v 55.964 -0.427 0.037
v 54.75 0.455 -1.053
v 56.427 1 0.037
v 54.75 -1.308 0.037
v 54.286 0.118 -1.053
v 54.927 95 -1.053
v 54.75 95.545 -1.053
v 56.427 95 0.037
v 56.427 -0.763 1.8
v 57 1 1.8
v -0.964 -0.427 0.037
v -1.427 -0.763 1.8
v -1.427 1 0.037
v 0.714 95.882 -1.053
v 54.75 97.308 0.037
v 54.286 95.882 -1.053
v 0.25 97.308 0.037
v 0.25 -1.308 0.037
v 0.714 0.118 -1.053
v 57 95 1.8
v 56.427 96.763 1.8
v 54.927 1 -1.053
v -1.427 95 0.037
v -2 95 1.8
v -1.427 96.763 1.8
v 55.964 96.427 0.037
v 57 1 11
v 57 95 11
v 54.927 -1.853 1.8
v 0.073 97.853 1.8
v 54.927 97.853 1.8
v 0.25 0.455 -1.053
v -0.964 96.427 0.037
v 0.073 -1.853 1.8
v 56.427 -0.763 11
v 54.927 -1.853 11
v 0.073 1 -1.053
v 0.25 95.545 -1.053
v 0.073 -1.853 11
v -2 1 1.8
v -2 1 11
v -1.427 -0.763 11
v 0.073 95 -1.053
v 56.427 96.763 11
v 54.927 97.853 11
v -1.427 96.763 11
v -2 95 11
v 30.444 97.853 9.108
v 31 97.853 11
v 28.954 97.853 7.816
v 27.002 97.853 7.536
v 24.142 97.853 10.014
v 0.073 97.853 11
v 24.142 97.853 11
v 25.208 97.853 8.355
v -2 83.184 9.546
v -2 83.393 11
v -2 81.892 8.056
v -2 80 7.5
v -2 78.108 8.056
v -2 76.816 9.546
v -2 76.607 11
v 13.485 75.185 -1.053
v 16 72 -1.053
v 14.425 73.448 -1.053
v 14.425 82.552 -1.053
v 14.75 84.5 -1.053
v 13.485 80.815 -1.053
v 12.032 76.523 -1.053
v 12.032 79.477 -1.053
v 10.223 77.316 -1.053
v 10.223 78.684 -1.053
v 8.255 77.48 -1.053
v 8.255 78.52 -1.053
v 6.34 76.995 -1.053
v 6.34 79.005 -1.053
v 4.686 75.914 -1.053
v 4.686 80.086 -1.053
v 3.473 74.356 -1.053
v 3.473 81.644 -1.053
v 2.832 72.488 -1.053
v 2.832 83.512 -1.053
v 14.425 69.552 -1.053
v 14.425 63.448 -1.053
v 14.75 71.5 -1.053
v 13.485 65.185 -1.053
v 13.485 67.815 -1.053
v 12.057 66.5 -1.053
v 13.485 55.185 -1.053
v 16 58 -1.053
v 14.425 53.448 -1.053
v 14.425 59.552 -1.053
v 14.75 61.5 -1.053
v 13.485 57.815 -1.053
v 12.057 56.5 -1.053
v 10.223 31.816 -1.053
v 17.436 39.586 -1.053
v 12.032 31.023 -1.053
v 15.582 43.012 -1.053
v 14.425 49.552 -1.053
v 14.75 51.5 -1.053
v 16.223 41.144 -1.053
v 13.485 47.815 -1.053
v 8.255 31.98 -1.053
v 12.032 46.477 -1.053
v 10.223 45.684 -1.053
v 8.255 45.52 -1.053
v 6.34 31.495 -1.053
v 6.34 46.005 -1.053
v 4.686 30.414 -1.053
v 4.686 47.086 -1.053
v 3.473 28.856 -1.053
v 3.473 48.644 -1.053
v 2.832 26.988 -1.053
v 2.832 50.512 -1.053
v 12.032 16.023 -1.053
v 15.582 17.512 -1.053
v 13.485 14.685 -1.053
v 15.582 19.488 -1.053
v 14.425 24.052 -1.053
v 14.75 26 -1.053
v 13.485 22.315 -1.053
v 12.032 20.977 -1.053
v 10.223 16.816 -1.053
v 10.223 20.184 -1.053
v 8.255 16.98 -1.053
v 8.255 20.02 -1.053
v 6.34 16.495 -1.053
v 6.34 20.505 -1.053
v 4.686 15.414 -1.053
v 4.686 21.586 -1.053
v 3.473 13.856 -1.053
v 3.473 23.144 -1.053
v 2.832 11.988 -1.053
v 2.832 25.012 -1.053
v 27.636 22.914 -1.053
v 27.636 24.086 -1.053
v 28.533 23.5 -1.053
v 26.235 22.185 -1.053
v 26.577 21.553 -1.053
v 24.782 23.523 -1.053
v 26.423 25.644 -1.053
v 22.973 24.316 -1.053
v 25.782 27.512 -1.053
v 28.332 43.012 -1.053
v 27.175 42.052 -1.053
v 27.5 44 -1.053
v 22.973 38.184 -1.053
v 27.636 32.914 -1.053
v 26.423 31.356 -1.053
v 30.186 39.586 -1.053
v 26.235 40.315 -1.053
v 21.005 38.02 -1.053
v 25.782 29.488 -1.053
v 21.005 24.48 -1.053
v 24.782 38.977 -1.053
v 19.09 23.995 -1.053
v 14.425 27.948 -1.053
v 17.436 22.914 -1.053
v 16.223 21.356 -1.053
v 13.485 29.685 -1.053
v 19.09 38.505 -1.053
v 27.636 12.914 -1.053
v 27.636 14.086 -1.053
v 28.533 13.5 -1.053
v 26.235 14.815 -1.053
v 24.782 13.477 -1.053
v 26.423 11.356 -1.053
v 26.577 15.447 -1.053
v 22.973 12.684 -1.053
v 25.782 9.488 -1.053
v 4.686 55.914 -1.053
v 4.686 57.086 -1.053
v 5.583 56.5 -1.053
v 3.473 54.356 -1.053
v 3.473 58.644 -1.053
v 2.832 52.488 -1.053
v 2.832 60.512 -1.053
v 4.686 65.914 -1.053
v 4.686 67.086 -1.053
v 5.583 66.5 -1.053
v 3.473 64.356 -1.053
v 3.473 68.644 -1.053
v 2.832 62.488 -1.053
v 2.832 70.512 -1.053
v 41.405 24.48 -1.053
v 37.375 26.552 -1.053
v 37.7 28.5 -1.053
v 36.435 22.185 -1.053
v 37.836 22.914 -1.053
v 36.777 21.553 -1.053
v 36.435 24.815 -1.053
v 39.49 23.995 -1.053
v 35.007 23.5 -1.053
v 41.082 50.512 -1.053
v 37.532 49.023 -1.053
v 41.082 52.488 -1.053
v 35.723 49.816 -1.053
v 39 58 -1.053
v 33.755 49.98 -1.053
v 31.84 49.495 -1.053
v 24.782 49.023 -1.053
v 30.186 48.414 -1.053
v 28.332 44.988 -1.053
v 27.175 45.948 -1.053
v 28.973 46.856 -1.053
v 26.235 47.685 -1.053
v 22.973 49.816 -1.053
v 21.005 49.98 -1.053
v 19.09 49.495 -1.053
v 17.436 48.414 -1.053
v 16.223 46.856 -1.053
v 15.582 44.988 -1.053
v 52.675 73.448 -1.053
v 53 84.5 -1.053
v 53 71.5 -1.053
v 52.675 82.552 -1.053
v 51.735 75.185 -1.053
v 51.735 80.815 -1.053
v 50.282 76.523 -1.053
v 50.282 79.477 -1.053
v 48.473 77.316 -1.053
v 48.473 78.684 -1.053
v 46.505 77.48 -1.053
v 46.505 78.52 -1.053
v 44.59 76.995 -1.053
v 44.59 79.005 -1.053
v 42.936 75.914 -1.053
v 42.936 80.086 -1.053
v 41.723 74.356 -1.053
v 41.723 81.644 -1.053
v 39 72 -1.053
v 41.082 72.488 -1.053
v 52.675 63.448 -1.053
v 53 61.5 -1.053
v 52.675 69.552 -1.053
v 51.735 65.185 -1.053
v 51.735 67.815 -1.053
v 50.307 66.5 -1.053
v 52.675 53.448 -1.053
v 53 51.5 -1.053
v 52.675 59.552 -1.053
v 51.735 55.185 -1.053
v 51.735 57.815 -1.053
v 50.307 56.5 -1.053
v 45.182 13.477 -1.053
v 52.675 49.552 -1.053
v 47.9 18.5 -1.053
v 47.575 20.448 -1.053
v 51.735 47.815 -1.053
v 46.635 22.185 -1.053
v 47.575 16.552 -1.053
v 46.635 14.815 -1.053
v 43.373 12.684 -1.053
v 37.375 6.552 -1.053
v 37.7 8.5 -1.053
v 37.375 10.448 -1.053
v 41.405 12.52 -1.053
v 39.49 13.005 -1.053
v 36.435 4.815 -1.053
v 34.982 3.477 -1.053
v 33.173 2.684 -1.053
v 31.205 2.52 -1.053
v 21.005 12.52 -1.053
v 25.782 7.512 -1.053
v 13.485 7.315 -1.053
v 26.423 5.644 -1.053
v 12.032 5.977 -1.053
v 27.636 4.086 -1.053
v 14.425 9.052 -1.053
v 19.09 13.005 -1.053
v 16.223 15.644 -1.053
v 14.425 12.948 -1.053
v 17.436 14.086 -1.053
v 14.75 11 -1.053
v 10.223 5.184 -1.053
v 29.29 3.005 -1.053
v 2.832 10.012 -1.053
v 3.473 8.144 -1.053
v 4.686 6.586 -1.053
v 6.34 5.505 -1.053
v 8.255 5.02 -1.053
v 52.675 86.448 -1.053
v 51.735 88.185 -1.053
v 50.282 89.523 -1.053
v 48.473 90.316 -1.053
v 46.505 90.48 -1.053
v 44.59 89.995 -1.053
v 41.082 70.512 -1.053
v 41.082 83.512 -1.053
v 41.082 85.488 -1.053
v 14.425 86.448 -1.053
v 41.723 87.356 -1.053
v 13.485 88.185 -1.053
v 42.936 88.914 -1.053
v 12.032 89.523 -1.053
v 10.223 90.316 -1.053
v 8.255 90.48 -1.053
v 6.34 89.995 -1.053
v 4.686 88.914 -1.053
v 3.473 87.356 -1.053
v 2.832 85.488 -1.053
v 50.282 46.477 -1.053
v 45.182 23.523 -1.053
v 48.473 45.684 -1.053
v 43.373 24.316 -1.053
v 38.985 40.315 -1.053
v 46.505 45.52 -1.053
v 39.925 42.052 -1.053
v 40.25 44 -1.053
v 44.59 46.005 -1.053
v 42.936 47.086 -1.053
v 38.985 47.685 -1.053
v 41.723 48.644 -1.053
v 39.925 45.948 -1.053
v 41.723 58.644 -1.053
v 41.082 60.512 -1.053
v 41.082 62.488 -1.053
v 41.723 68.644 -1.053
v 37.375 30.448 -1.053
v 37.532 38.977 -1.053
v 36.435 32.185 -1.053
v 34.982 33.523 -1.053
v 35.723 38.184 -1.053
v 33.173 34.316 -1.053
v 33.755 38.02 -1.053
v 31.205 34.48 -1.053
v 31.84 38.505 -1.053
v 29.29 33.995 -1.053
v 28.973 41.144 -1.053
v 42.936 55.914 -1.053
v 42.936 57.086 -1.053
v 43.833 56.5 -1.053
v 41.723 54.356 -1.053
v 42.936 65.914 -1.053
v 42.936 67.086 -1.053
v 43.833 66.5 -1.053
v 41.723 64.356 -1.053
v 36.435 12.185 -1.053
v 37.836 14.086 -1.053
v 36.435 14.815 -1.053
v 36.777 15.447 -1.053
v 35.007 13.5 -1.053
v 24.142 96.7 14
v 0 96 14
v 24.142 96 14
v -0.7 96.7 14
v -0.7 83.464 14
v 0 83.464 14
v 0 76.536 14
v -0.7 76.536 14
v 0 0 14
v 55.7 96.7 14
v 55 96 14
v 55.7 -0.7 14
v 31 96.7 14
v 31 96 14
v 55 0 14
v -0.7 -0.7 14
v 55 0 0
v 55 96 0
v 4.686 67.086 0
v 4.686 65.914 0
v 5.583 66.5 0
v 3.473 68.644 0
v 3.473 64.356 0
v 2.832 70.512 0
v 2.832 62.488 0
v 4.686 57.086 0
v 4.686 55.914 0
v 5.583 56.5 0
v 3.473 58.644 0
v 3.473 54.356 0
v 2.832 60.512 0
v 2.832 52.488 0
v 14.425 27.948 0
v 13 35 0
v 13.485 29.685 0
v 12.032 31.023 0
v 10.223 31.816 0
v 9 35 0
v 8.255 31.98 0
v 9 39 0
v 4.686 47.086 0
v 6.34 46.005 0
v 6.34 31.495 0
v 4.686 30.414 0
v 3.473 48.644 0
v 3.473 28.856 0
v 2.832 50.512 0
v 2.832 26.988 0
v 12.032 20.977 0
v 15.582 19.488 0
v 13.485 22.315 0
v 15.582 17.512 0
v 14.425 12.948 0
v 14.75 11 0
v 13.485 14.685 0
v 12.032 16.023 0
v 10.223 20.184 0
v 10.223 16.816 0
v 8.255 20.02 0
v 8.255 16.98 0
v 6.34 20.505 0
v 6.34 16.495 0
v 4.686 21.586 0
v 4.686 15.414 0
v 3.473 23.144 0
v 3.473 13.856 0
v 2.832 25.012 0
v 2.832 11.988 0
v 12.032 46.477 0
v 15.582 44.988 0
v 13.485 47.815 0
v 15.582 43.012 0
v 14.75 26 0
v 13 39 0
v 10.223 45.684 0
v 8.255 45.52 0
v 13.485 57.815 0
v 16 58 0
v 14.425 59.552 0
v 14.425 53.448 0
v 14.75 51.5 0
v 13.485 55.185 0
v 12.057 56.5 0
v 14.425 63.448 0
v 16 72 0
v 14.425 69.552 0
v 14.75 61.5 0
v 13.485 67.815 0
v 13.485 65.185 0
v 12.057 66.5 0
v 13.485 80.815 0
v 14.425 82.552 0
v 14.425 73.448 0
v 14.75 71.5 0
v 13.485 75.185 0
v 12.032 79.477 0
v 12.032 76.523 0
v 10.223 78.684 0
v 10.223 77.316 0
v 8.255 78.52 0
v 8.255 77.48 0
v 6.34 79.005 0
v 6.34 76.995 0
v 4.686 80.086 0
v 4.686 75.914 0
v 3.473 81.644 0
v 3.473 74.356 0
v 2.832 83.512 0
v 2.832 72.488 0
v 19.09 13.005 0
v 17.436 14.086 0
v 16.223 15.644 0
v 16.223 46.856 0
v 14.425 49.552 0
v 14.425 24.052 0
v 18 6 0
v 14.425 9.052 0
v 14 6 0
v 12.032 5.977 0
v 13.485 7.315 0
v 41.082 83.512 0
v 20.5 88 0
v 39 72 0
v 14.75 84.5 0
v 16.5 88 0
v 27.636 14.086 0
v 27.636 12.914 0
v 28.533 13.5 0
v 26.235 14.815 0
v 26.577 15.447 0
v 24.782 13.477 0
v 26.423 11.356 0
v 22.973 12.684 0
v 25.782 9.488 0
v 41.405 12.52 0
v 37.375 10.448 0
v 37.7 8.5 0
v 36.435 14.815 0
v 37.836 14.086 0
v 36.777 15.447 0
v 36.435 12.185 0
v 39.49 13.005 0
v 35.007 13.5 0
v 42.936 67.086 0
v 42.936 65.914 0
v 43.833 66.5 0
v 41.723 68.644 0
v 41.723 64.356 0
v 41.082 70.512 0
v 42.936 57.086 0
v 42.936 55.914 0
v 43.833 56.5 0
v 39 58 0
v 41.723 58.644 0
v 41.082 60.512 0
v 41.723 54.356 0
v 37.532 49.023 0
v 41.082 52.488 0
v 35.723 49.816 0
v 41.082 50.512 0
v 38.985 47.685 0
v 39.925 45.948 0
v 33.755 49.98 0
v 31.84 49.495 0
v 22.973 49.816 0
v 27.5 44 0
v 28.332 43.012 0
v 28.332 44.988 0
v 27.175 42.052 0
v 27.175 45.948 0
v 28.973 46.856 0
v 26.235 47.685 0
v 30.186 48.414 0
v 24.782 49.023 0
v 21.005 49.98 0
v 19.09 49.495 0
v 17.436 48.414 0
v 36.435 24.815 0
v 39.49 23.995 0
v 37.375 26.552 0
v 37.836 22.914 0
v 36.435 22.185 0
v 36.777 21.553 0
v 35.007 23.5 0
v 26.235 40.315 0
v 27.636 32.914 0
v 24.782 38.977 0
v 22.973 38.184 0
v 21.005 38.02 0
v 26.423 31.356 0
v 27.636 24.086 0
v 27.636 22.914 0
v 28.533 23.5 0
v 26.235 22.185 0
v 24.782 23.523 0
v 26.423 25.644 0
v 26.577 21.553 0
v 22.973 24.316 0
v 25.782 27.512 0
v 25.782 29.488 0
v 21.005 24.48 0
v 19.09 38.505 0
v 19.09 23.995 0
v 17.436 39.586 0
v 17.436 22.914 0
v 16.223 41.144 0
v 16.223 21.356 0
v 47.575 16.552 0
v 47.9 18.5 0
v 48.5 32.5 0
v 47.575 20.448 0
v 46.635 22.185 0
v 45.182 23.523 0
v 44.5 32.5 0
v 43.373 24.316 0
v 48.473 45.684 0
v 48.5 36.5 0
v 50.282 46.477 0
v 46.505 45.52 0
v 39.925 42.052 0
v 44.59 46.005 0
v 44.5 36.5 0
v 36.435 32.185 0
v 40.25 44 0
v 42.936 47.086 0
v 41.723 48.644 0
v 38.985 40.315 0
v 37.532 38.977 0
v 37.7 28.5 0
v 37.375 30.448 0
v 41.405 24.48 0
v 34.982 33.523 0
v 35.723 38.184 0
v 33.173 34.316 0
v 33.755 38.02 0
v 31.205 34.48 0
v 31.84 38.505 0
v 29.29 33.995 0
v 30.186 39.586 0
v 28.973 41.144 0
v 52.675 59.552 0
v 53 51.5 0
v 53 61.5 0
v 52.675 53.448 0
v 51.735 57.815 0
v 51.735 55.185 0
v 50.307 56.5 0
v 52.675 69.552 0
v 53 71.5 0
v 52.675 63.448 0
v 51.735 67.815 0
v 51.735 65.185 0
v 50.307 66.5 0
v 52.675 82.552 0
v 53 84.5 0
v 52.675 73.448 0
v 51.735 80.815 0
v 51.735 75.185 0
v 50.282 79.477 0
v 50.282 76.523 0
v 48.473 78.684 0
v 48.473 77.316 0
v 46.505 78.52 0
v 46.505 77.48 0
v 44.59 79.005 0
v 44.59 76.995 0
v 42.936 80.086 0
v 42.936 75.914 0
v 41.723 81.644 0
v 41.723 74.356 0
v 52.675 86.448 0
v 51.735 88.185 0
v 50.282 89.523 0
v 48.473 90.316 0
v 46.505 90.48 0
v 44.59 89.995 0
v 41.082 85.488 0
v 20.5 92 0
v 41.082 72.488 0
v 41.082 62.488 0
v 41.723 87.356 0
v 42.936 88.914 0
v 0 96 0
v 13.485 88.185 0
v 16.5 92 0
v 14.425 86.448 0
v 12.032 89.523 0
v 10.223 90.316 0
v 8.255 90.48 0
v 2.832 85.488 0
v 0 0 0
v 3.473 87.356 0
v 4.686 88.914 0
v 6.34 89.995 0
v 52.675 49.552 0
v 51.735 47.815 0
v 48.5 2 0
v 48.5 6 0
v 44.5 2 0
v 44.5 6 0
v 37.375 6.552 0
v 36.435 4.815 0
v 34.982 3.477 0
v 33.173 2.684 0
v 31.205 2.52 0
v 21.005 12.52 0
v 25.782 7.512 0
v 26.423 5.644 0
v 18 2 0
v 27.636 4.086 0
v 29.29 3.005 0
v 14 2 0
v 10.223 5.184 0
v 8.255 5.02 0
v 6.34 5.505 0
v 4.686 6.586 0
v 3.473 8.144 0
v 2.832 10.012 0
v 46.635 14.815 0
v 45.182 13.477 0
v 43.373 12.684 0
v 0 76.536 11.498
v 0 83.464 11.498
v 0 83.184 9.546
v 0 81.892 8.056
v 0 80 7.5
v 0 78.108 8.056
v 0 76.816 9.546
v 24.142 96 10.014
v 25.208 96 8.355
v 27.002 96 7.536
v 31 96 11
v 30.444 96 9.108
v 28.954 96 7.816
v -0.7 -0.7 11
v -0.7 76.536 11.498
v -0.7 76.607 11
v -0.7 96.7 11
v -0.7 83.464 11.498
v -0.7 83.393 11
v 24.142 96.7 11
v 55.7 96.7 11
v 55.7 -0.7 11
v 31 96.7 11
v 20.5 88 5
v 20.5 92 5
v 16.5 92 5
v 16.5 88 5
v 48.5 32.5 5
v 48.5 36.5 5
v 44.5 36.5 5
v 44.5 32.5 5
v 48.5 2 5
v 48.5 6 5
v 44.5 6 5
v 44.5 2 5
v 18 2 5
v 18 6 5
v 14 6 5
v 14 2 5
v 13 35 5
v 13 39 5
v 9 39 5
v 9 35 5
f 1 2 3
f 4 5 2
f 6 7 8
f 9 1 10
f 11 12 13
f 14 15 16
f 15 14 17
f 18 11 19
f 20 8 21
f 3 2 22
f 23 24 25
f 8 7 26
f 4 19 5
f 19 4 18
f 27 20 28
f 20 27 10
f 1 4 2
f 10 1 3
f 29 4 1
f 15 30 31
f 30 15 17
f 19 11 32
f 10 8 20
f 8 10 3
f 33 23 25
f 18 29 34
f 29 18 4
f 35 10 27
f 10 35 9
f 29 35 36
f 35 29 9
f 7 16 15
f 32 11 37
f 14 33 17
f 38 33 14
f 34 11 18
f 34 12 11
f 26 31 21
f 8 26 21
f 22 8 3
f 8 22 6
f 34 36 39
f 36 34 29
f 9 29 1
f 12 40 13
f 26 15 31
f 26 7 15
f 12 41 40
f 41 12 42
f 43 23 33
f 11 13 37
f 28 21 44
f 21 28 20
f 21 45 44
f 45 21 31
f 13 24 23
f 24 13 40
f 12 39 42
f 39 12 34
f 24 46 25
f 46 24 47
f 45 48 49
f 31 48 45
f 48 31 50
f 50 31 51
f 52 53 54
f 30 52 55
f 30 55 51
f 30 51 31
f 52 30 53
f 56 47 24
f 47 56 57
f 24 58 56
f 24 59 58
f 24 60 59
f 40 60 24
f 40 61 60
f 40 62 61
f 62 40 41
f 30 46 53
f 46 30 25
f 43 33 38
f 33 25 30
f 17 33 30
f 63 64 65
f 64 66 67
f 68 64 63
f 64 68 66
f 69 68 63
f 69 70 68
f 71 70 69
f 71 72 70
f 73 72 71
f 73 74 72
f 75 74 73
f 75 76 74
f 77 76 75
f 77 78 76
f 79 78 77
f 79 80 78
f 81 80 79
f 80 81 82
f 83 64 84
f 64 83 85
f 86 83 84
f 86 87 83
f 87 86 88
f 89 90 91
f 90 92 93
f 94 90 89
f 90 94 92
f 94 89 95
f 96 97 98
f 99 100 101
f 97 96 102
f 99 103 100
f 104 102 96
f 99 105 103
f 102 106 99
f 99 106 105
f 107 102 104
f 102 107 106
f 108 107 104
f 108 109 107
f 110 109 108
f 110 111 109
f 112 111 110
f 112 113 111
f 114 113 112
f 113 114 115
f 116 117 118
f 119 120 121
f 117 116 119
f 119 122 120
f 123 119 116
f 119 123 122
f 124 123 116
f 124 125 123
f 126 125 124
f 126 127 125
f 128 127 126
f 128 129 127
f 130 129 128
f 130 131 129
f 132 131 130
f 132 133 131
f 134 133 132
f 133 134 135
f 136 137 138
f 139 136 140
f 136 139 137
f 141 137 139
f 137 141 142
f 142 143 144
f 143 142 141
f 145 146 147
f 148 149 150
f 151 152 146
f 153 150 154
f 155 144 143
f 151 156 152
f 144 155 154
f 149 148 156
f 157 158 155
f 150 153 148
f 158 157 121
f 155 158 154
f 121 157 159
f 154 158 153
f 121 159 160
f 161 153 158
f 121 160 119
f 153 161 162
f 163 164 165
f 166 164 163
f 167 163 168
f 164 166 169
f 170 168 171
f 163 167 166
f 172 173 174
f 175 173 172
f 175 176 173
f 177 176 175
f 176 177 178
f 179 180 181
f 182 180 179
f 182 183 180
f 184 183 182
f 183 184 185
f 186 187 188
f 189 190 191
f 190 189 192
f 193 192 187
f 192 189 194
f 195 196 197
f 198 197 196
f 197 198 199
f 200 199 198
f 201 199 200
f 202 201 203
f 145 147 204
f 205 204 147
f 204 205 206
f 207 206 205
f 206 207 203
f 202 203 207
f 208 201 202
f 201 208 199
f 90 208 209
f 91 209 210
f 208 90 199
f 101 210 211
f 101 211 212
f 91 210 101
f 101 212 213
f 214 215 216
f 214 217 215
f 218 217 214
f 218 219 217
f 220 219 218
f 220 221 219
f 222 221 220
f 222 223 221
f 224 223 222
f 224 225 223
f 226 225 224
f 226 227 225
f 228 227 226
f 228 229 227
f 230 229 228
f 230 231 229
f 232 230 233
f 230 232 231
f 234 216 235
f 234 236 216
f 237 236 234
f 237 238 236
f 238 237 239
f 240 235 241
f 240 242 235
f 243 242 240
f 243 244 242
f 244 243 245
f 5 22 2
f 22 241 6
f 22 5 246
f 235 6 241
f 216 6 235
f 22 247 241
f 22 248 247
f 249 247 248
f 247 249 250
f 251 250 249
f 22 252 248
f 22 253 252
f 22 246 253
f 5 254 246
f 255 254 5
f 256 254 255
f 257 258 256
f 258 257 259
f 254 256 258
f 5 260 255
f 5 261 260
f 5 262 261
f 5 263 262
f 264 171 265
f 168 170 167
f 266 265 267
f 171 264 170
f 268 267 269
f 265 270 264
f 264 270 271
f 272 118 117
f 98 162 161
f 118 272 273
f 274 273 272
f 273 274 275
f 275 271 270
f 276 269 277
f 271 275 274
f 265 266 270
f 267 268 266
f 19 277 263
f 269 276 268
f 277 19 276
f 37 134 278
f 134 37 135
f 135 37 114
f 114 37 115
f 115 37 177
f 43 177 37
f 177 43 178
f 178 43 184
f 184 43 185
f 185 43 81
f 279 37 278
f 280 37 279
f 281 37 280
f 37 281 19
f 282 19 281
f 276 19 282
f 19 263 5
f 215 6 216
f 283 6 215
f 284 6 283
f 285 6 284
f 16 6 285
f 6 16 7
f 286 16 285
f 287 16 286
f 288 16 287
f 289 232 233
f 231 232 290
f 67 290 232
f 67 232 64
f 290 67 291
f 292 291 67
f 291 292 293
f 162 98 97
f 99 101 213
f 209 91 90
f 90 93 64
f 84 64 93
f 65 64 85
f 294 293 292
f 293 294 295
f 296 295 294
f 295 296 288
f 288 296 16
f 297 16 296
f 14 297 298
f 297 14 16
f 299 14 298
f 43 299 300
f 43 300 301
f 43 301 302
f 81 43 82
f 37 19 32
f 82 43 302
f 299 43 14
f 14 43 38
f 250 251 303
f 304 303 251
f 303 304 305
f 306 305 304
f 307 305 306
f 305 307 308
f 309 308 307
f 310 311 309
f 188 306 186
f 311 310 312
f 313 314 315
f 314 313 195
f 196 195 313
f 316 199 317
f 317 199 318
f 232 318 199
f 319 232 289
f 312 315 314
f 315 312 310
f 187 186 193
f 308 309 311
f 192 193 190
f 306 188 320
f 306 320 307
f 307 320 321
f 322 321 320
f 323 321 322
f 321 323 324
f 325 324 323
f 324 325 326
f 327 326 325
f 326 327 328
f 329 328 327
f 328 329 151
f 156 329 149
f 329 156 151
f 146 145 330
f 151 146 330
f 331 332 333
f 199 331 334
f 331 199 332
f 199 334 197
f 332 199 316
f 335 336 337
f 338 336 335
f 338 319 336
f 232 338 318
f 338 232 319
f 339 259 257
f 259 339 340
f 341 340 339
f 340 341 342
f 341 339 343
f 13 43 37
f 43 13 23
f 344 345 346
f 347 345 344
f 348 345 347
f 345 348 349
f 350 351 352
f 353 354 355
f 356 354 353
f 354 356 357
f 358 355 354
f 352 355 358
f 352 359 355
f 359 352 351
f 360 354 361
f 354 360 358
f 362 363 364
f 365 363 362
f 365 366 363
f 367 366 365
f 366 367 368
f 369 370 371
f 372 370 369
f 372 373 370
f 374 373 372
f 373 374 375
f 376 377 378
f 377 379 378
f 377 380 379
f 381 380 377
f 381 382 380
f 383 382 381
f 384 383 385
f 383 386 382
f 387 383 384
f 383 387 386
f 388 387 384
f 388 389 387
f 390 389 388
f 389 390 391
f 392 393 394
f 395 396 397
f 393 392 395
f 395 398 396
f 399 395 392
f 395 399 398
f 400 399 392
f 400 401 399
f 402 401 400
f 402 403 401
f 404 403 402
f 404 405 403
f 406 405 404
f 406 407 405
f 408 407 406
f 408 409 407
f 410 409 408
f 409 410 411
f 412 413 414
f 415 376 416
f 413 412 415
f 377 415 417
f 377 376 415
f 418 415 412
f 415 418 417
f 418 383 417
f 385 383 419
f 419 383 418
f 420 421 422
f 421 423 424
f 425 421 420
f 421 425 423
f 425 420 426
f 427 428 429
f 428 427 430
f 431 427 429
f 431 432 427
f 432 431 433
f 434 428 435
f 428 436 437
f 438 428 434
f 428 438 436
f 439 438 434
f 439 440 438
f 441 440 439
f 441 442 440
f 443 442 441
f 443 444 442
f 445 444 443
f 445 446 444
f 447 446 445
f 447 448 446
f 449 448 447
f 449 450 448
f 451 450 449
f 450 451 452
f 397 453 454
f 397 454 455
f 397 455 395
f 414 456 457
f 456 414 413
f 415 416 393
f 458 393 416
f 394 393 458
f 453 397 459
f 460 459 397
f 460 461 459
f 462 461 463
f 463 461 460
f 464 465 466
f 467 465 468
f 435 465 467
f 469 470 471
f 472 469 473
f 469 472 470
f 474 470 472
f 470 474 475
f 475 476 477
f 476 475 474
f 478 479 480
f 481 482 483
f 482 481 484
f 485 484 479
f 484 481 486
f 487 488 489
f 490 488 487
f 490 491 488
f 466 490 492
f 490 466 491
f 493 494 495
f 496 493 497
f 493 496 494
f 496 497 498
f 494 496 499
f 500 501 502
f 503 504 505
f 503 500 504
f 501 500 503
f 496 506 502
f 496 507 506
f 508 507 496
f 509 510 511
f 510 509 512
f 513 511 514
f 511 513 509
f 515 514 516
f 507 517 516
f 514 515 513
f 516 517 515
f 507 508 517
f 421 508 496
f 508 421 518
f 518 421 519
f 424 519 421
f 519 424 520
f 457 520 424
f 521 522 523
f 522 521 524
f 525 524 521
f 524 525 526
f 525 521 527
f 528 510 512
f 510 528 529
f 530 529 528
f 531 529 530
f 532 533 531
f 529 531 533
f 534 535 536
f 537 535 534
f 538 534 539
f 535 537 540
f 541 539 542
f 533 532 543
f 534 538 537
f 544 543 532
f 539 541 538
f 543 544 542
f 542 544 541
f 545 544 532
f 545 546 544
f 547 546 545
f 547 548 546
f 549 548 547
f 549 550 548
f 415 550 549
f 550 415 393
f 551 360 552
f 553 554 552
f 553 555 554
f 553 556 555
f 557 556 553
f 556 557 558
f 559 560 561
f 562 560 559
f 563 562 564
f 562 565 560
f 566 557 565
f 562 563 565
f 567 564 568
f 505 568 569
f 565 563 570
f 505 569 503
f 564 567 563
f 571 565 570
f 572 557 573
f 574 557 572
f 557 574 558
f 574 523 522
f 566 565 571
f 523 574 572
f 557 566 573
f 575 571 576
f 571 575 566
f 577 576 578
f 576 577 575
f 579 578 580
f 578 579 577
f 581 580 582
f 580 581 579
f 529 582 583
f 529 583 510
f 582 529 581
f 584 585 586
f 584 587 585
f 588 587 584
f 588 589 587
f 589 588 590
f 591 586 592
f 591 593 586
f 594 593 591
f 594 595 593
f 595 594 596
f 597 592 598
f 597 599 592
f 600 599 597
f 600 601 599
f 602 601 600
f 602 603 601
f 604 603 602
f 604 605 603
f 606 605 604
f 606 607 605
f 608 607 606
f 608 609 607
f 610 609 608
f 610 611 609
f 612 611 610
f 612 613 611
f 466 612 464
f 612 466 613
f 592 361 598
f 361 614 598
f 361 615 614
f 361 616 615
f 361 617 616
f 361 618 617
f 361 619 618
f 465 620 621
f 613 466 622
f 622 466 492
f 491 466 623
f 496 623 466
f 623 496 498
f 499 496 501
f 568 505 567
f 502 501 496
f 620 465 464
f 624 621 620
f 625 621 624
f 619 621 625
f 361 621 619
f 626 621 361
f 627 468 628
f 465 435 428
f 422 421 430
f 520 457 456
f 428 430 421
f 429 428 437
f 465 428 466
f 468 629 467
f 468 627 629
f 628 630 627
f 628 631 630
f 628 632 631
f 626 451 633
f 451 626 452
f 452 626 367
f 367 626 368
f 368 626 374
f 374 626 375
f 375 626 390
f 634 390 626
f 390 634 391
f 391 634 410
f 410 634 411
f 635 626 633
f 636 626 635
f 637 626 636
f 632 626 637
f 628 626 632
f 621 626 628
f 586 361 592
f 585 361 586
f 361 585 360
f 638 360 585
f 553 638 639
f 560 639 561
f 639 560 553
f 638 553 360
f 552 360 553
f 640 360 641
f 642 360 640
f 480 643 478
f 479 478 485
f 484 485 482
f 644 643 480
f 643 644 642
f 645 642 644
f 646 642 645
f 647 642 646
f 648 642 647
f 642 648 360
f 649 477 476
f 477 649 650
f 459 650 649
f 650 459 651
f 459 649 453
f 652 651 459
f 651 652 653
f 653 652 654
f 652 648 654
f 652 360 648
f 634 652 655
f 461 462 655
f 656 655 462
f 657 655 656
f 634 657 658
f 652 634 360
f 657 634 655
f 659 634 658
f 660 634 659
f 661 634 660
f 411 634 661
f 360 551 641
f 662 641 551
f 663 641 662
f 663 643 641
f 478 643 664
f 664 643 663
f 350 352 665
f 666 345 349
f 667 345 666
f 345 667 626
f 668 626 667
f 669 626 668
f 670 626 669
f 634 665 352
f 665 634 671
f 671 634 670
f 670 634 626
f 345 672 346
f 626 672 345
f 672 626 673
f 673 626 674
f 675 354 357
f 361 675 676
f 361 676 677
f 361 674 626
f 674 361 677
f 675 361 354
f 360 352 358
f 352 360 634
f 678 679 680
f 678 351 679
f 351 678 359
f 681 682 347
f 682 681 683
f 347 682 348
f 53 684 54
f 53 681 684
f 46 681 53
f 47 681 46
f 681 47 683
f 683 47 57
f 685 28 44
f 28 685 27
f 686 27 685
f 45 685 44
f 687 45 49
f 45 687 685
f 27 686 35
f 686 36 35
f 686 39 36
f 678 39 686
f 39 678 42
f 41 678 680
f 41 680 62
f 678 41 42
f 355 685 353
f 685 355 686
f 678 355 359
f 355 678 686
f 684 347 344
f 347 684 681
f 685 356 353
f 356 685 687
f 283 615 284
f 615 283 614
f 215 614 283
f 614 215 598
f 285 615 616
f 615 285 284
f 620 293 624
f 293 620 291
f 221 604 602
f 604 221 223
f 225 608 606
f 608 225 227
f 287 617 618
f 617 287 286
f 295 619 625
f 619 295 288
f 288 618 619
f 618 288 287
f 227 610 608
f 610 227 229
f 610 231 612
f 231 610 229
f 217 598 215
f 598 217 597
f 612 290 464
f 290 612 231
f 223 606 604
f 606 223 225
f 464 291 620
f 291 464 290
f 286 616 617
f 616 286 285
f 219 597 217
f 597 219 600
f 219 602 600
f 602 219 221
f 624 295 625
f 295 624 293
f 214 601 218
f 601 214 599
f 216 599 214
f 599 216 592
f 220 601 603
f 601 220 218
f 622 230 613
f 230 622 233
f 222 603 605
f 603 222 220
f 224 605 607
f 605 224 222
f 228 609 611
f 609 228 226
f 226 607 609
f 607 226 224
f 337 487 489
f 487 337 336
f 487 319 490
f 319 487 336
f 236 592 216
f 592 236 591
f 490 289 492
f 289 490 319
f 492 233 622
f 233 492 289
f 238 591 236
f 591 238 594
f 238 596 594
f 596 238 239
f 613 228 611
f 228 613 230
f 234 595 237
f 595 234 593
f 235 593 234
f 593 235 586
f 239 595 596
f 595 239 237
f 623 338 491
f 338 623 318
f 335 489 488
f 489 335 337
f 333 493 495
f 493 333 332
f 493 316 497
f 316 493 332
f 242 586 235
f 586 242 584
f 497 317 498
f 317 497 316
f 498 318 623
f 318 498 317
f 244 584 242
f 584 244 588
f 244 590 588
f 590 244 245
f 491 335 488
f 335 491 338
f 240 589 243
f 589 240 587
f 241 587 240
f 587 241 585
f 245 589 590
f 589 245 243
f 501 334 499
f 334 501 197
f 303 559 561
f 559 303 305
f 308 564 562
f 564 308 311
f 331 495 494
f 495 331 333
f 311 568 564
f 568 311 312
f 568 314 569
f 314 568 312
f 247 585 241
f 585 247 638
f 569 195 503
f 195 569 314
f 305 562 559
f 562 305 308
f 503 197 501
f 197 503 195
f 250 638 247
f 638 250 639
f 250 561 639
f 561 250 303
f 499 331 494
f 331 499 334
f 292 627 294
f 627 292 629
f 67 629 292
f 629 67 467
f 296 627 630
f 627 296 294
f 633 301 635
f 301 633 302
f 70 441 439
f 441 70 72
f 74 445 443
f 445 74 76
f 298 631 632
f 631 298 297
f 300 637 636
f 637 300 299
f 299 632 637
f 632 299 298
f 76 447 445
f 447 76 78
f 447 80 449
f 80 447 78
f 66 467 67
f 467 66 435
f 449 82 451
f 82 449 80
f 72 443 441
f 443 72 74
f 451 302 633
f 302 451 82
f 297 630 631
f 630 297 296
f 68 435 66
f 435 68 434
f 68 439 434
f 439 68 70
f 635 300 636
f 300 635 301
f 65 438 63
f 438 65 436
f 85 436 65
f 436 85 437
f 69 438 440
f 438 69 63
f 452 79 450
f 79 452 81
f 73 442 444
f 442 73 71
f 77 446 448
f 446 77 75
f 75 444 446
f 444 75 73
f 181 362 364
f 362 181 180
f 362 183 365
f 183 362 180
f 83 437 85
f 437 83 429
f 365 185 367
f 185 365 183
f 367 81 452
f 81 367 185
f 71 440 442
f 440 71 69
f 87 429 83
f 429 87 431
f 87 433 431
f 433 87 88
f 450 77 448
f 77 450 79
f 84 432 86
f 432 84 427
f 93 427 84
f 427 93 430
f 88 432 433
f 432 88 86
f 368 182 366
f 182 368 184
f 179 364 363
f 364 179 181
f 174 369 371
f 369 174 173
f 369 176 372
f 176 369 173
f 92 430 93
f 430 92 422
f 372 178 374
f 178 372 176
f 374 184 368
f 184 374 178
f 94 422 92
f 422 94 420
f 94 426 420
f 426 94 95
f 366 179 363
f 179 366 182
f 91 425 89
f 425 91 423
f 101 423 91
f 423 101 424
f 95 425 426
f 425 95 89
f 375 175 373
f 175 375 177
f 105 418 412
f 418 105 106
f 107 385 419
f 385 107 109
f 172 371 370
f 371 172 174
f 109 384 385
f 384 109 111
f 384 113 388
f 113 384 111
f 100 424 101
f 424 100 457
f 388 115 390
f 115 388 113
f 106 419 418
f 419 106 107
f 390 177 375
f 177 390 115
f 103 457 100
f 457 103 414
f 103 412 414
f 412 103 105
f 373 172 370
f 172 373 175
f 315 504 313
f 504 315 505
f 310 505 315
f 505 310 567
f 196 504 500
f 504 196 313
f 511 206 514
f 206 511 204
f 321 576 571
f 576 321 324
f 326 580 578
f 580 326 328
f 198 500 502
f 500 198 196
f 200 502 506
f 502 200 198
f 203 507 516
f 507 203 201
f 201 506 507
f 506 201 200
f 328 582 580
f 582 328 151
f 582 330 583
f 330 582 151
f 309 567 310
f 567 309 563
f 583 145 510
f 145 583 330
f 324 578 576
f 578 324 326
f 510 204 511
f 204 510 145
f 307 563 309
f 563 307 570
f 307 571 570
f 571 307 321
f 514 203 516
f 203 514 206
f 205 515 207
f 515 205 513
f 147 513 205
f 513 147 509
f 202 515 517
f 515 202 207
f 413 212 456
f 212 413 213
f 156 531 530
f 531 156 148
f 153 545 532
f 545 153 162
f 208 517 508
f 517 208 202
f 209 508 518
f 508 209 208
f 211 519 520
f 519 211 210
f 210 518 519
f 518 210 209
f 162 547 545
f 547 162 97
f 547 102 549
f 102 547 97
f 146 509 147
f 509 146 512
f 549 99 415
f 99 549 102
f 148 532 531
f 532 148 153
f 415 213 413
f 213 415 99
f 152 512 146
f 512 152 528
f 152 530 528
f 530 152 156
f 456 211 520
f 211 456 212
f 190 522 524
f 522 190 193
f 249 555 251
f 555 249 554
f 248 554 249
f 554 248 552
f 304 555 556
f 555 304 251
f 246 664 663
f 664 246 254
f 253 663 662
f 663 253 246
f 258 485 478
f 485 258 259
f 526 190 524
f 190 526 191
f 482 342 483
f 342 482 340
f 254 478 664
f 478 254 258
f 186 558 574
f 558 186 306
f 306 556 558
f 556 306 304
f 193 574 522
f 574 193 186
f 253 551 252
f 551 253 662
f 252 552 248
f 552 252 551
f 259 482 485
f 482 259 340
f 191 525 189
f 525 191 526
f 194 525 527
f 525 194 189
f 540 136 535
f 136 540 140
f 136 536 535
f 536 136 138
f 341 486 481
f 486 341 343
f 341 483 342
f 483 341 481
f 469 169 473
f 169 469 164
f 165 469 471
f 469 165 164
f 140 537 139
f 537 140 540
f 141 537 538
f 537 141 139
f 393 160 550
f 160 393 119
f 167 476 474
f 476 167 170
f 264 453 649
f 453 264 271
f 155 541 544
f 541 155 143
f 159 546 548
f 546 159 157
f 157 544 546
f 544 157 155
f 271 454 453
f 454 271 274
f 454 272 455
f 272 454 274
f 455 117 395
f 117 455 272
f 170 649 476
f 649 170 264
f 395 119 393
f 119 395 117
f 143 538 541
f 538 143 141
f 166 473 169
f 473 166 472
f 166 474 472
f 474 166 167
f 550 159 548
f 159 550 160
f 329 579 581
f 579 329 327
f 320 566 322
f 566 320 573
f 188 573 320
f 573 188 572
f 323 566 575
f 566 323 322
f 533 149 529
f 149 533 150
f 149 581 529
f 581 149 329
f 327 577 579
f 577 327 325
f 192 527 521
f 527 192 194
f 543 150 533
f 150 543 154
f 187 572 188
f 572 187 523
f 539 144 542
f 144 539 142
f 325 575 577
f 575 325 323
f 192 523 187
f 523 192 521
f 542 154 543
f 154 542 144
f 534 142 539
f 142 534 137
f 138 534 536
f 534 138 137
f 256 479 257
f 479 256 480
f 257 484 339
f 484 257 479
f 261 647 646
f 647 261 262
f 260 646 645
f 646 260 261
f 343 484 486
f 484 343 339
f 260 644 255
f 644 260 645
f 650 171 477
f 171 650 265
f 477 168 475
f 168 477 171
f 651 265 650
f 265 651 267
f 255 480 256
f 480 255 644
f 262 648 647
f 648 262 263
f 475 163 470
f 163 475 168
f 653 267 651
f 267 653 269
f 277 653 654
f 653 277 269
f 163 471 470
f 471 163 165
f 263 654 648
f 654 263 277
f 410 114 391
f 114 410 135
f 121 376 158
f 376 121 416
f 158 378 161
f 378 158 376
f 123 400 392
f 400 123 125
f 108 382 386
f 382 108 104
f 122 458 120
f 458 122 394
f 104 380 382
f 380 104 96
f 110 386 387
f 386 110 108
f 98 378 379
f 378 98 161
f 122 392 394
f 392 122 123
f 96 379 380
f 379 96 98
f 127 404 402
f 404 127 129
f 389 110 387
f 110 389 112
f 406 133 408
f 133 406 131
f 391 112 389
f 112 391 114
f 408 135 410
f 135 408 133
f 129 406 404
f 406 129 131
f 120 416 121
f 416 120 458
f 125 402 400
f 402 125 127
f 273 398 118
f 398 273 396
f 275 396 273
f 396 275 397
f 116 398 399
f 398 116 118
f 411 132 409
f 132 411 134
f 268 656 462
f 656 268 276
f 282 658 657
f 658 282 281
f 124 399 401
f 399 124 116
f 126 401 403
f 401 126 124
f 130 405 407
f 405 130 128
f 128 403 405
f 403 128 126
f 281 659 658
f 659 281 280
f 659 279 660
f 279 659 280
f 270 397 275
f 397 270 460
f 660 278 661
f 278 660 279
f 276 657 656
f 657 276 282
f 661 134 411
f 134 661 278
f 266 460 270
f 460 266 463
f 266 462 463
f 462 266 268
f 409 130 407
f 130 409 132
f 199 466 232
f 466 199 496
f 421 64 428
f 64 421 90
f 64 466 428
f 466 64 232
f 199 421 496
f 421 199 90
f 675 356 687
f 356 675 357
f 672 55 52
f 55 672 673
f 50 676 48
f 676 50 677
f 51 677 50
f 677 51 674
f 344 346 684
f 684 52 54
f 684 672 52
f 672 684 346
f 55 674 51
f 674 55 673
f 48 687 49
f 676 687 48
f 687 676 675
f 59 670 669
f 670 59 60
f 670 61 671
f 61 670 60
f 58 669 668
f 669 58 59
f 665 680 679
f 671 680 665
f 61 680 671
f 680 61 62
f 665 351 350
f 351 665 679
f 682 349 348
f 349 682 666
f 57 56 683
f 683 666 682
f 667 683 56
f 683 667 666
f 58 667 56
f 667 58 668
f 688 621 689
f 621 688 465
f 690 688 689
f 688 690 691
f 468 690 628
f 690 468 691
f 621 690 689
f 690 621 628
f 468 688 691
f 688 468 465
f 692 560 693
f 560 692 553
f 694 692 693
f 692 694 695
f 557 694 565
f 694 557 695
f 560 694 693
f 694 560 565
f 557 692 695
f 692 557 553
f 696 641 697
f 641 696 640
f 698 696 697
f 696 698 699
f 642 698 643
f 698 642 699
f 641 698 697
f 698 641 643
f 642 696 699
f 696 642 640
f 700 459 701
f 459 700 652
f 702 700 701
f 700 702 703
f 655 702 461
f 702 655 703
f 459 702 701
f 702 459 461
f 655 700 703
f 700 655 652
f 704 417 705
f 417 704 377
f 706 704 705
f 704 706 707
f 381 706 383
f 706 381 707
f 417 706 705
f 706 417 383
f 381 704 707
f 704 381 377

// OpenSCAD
/*

    A case for my custom built TV Remote Control.
    It contains two circuit boards sanwiched together (which is why it is quite chunky).
    The top one, just has buttons and a small screen, the bottom one has the arduino.
    
    Print Notes
        I had some trouble with warping, and lifting from the print bed, so I printed with a brim, and
        them strapped the piece down with extra pieces of blue tape.
    
*/

thickness = 2;
sheet = 1.2;
overlap = 3;
width = 55;
length = 96;
height = 14;

radius = 3;

module rounded( width, length, height, radius )
{
    module roundedFlat()
    {
        hull() {
            translate( [radius,radius,radius] ) sphere( r=radius );
            translate( [width-radius,radius,radius] ) sphere( r=radius );
            translate( [radius,length-radius,radius] ) sphere( r=radius );
            translate( [width-radius,length-radius,radius] ) sphere( r=radius );
        }
    }

    hull() {
        roundedFlat();
        translate( [0,0, height - radius * 2] ) roundedFlat();
    }
}

module post( x, y, size=4, height=3 )
{
    translate( [x-size/2,y-size/2,0] ) {
        cube( [size, size, height] );
    }
}

module case()
{
    translate( [-thickness, -thickness, -sheet] ) 
    intersection() {
        rounded( width + thickness* 2, length + thickness*2, height*2, radius );
        cube( [ width + thickness* 2, length + thickness*2, height+sheet ] );
    }
}

module powerSwitchHole( left=0 )
{
    translate([width-left*width,80,height - left*overlap]) rotate([0,90,0])
    hull() {
        cylinder( d=7, h=10, center=true );
        translate([-10,0,0]) rotate([0,90,0]) cylinder( d=7, h=10, center=true );
    }
}

module buttonHole( x, y )
{
    translate( [width -x, y, -sheet/2] ) cylinder( d=12, h=sheet*2, center=true );
}

module ledHole( left=0 )
{
    translate([ width/2, length, height]) rotate( [90,0,0] ) hull() {
        cylinder( d=7, h=10, center=true );
        translate([0,-3,0]) cylinder( d=7, h=10, center=true );
    }
}

module base()
{    
    difference() {
        case();

        cube( [width, length, height*2] );
        translate([-thickness/2, -thickness/2,height-overlap]) cube( [width+thickness, length+thickness, overlap+1] );
        
        ledHole();
        powerSwitchHole();
    }

    post( 36, 74 );
    post( 18.5, 74 );
    post( 4, 7 );
    post( width-4, 7 );
}

module top()
{
    slack=0.3;
    
    pitch = 2.55;
    col1 = 8;
    col2 = col1 + 2 * pitch;
    col3 = col1 + 5 * pitch;
    col4 = col1 + 6 * pitch;
    col5 = col1 + 10 * pitch;
    col6 = col1 + 15 * pitch;

    echo( "col6", col6, "was 47" );
    
    row1 = 8.5;
    row2 = row1 + pitch;
    row3 = row1 + pitch * 2;
    row4 = row1 + pitch * 8;
    row5 = row1 + pitch * 14;
    row6 = row1 + pitch * 17;
    row7 = row1 + pitch * 21;
    row8 = row1 + pitch * 25;
    row9 = row1 + pitch * 30;
    echo( "row 8", row8, "was 71" );
    
    difference() {
        case();

        cube( [width, length, height*2] ); // Inside

        translate([-10-thickness/2+slack,-thickness,height-overlap])
            cube( [10,length+10, thickness*2] ); // Left edge

        translate([width+thickness/2-slack,-thickness,height-overlap])
            cube( [10,length+10, thickness*2] ); // Right edge

        translate([-5,-10-thickness/2+slack,height-overlap])
            cube( [width+10,10, thickness*2] ) ;// Bottom edge

        translate([-5,length+thickness/2-slack,height-overlap])
            cube( [width+10,10, thickness*2] ); // Top edge

        // Top Left buttons
        buttonHole( col1, 84.5 );
        buttonHole( col1, 71.5 );
        buttonHole( col1, 61.5 );
        buttonHole( col1, 51.5 );

        // Top Right buttons
        buttonHole( col6, 84.5 );
        buttonHole( col6, 71.5 );
        buttonHole( col6, 61.5 );
        buttonHole( col6, 51.5 );

        // Left/Right buttons
        buttonHole( col3, 44 );
        buttonHole( col5, 44 );

        // Direction buttons
        buttonHole( col2, 18.5 );
        buttonHole( col4, 18.5 );
        buttonHole( col5, 18.5 );
        buttonHole( col4, 28.5 );
        buttonHole( col4, 8.5 );

        // Volumne buttons
        buttonHole( col6, 26 );        
        buttonHole( col6, 11 );        

        // Screen
        translate( [16, 58, -height] ) cube( [width-16*2,14, height*2] );

        ledHole(1);
        powerSwitchHole(1);

    }

    post( 18.5, 90, height=5 );
    post( 46.5, 34.5, height=5 );
    post( 46.5, 4, height=5 );
    post( 16, 4, height=5 );
    post( 11, 37, height=5 );
}

top();
